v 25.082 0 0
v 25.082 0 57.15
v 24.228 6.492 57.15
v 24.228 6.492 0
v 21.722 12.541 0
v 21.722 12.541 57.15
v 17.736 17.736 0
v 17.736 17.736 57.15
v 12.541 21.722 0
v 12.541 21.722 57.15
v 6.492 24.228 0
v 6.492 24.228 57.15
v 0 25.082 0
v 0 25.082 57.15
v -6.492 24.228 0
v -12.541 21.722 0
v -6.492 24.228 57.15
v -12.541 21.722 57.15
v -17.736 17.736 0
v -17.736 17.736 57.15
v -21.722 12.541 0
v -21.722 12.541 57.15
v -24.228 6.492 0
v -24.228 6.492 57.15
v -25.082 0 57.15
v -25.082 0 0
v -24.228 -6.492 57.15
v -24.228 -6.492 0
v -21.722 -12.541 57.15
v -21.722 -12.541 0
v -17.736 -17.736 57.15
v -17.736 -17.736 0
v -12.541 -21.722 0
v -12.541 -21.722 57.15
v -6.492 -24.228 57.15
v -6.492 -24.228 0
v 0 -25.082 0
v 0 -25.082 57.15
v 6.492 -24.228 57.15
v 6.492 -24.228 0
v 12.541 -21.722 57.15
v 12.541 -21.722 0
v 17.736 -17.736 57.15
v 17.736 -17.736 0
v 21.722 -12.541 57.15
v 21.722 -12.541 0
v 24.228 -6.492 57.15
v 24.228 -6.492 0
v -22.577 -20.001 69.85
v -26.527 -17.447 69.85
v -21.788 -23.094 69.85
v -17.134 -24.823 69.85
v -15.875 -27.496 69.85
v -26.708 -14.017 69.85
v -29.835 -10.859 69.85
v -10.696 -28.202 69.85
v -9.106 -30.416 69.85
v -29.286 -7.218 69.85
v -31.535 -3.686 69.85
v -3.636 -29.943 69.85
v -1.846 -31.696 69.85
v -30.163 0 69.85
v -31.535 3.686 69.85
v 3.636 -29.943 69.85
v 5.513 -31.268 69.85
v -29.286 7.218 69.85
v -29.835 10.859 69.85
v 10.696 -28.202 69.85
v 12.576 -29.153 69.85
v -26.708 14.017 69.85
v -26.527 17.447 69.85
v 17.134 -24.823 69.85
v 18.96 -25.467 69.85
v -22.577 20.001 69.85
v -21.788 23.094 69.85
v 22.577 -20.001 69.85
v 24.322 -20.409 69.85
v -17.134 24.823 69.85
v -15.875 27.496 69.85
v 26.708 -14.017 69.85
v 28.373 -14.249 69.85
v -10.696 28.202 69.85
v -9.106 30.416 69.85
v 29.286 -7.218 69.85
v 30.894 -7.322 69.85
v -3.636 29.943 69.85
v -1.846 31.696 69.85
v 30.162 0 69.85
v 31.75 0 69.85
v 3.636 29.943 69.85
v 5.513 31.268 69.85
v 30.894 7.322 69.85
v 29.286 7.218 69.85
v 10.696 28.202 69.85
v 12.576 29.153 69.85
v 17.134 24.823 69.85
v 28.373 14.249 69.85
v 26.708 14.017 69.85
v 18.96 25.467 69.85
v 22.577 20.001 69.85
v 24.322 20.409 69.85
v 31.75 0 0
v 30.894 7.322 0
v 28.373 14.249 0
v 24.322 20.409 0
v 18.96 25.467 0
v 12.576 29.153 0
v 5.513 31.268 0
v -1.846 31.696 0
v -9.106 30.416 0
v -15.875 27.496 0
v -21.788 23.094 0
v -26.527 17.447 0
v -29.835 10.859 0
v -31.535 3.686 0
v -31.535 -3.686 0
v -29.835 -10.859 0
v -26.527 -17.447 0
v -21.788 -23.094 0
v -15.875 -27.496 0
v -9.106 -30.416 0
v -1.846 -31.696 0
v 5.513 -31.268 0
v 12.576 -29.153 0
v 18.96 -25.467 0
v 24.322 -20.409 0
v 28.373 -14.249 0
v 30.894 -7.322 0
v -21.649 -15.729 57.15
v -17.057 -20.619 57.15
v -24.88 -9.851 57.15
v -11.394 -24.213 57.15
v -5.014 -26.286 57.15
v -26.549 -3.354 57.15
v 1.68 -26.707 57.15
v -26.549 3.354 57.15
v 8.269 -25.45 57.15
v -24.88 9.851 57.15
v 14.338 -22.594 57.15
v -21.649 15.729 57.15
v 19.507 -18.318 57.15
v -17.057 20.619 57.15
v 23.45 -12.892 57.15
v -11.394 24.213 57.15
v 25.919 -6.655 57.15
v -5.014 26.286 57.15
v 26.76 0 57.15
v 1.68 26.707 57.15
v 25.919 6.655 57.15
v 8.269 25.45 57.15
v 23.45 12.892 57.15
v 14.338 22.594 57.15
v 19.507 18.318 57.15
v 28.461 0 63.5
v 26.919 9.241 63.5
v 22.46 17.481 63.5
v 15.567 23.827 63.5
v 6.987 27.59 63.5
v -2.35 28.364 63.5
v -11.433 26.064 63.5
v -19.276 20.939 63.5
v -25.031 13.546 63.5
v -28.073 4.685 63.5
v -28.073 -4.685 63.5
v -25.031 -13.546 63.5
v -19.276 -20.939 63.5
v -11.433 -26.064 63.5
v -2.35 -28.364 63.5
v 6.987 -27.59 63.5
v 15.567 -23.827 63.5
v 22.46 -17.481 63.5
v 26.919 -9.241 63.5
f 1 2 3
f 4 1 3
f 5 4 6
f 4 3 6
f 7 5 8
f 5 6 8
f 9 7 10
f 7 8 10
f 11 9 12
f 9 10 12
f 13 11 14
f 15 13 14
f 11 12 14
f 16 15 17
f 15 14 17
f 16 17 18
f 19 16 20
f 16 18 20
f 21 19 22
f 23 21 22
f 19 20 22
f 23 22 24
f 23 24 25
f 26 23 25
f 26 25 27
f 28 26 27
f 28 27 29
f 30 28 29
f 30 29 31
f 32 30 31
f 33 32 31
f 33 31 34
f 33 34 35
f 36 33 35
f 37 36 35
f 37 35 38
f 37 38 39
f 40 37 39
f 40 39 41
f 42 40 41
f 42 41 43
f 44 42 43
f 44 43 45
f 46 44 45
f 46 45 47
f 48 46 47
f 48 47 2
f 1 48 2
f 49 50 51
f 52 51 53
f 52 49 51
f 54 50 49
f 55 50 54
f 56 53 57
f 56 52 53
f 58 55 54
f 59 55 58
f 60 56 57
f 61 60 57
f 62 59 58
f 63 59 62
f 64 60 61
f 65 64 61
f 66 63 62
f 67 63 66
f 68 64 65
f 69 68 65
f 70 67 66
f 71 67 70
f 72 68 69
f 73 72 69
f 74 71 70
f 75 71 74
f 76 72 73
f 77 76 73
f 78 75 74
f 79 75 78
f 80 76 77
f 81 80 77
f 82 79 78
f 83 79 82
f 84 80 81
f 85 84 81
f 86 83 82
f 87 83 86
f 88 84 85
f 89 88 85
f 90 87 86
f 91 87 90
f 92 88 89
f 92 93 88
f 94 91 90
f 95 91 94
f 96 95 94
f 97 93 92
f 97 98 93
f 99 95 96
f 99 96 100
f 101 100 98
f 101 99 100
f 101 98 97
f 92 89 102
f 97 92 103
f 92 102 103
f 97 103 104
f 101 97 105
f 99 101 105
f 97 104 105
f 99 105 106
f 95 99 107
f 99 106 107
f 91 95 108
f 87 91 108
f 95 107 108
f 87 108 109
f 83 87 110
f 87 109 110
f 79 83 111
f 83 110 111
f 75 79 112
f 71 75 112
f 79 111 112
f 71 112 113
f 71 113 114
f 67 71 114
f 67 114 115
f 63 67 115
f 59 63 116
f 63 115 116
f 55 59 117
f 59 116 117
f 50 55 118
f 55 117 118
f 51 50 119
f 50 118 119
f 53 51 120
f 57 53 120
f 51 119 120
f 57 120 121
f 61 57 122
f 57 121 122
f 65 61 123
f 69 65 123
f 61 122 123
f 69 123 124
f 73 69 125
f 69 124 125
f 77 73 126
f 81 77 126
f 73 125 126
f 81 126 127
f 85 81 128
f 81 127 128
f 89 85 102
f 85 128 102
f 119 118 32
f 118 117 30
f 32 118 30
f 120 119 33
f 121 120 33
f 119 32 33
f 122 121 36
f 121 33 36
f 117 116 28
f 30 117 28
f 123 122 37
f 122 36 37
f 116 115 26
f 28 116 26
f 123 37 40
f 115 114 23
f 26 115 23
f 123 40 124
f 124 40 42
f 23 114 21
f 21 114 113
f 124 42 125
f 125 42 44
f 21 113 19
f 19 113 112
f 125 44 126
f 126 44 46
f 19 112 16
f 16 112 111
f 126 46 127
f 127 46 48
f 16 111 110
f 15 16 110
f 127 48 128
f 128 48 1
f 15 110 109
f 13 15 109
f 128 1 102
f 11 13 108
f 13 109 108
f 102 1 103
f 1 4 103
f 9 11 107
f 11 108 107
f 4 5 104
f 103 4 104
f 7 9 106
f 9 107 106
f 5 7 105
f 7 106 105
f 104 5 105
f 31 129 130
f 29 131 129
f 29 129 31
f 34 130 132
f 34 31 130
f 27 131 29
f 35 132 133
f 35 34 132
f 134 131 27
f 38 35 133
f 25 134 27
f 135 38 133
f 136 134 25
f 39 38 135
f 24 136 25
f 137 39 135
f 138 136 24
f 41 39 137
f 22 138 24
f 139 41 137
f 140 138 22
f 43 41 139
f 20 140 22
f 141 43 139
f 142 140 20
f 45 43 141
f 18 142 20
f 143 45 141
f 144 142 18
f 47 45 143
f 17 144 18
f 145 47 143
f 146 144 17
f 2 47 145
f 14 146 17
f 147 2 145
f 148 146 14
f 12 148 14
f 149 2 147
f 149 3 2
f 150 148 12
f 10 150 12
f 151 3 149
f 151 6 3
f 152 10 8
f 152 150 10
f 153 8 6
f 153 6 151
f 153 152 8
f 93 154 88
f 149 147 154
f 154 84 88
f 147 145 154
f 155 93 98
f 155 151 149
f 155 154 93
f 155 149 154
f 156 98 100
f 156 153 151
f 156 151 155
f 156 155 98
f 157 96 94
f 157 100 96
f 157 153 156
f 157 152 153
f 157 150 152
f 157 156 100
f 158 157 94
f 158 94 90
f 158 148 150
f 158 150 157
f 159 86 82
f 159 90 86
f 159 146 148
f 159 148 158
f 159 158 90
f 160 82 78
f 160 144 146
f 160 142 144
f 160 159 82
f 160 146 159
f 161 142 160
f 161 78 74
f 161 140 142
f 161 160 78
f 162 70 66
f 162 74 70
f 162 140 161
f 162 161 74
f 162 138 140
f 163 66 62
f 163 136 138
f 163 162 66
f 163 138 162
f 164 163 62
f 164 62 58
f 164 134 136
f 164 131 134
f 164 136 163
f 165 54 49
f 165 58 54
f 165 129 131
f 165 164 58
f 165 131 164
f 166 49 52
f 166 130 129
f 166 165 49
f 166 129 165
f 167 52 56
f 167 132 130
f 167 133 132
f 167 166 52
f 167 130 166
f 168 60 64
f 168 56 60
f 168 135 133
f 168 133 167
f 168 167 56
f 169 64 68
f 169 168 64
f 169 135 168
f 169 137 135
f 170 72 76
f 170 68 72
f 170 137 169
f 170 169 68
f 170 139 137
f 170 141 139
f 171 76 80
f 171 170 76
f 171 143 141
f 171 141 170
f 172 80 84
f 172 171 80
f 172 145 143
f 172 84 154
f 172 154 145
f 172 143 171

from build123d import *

# Parameters (mm, degrees)
F0_R     = 31.75
F1_DEPTH = 69.85
F2_R     = 30.1625
F3_DEPTH = 12.7
F3_TAPER = 15
F4_R     = 25.0825
F5_DEPTH = 57.151


with BuildPart() as f1:
    # F0 (on Top) → F1 (new body)
    with BuildSketch(Plane.XY):
        Circle(F0_R)
    extrude(amount=F1_DEPTH)

    # F2 (on face) → F3 (cut)
    with BuildSketch(Plane.XY.offset(69.85)):
        Circle(F2_R)
    extrude(amount=-F3_DEPTH, taper=F3_TAPER, mode=Mode.SUBTRACT)

    # F4 (on face) → F5 (cut, through all)
    with BuildSketch(Plane.XY.offset(57.15)):
        Circle(F4_R)
    extrude(amount=-F5_DEPTH, mode=Mode.SUBTRACT)


solid = f1.part
